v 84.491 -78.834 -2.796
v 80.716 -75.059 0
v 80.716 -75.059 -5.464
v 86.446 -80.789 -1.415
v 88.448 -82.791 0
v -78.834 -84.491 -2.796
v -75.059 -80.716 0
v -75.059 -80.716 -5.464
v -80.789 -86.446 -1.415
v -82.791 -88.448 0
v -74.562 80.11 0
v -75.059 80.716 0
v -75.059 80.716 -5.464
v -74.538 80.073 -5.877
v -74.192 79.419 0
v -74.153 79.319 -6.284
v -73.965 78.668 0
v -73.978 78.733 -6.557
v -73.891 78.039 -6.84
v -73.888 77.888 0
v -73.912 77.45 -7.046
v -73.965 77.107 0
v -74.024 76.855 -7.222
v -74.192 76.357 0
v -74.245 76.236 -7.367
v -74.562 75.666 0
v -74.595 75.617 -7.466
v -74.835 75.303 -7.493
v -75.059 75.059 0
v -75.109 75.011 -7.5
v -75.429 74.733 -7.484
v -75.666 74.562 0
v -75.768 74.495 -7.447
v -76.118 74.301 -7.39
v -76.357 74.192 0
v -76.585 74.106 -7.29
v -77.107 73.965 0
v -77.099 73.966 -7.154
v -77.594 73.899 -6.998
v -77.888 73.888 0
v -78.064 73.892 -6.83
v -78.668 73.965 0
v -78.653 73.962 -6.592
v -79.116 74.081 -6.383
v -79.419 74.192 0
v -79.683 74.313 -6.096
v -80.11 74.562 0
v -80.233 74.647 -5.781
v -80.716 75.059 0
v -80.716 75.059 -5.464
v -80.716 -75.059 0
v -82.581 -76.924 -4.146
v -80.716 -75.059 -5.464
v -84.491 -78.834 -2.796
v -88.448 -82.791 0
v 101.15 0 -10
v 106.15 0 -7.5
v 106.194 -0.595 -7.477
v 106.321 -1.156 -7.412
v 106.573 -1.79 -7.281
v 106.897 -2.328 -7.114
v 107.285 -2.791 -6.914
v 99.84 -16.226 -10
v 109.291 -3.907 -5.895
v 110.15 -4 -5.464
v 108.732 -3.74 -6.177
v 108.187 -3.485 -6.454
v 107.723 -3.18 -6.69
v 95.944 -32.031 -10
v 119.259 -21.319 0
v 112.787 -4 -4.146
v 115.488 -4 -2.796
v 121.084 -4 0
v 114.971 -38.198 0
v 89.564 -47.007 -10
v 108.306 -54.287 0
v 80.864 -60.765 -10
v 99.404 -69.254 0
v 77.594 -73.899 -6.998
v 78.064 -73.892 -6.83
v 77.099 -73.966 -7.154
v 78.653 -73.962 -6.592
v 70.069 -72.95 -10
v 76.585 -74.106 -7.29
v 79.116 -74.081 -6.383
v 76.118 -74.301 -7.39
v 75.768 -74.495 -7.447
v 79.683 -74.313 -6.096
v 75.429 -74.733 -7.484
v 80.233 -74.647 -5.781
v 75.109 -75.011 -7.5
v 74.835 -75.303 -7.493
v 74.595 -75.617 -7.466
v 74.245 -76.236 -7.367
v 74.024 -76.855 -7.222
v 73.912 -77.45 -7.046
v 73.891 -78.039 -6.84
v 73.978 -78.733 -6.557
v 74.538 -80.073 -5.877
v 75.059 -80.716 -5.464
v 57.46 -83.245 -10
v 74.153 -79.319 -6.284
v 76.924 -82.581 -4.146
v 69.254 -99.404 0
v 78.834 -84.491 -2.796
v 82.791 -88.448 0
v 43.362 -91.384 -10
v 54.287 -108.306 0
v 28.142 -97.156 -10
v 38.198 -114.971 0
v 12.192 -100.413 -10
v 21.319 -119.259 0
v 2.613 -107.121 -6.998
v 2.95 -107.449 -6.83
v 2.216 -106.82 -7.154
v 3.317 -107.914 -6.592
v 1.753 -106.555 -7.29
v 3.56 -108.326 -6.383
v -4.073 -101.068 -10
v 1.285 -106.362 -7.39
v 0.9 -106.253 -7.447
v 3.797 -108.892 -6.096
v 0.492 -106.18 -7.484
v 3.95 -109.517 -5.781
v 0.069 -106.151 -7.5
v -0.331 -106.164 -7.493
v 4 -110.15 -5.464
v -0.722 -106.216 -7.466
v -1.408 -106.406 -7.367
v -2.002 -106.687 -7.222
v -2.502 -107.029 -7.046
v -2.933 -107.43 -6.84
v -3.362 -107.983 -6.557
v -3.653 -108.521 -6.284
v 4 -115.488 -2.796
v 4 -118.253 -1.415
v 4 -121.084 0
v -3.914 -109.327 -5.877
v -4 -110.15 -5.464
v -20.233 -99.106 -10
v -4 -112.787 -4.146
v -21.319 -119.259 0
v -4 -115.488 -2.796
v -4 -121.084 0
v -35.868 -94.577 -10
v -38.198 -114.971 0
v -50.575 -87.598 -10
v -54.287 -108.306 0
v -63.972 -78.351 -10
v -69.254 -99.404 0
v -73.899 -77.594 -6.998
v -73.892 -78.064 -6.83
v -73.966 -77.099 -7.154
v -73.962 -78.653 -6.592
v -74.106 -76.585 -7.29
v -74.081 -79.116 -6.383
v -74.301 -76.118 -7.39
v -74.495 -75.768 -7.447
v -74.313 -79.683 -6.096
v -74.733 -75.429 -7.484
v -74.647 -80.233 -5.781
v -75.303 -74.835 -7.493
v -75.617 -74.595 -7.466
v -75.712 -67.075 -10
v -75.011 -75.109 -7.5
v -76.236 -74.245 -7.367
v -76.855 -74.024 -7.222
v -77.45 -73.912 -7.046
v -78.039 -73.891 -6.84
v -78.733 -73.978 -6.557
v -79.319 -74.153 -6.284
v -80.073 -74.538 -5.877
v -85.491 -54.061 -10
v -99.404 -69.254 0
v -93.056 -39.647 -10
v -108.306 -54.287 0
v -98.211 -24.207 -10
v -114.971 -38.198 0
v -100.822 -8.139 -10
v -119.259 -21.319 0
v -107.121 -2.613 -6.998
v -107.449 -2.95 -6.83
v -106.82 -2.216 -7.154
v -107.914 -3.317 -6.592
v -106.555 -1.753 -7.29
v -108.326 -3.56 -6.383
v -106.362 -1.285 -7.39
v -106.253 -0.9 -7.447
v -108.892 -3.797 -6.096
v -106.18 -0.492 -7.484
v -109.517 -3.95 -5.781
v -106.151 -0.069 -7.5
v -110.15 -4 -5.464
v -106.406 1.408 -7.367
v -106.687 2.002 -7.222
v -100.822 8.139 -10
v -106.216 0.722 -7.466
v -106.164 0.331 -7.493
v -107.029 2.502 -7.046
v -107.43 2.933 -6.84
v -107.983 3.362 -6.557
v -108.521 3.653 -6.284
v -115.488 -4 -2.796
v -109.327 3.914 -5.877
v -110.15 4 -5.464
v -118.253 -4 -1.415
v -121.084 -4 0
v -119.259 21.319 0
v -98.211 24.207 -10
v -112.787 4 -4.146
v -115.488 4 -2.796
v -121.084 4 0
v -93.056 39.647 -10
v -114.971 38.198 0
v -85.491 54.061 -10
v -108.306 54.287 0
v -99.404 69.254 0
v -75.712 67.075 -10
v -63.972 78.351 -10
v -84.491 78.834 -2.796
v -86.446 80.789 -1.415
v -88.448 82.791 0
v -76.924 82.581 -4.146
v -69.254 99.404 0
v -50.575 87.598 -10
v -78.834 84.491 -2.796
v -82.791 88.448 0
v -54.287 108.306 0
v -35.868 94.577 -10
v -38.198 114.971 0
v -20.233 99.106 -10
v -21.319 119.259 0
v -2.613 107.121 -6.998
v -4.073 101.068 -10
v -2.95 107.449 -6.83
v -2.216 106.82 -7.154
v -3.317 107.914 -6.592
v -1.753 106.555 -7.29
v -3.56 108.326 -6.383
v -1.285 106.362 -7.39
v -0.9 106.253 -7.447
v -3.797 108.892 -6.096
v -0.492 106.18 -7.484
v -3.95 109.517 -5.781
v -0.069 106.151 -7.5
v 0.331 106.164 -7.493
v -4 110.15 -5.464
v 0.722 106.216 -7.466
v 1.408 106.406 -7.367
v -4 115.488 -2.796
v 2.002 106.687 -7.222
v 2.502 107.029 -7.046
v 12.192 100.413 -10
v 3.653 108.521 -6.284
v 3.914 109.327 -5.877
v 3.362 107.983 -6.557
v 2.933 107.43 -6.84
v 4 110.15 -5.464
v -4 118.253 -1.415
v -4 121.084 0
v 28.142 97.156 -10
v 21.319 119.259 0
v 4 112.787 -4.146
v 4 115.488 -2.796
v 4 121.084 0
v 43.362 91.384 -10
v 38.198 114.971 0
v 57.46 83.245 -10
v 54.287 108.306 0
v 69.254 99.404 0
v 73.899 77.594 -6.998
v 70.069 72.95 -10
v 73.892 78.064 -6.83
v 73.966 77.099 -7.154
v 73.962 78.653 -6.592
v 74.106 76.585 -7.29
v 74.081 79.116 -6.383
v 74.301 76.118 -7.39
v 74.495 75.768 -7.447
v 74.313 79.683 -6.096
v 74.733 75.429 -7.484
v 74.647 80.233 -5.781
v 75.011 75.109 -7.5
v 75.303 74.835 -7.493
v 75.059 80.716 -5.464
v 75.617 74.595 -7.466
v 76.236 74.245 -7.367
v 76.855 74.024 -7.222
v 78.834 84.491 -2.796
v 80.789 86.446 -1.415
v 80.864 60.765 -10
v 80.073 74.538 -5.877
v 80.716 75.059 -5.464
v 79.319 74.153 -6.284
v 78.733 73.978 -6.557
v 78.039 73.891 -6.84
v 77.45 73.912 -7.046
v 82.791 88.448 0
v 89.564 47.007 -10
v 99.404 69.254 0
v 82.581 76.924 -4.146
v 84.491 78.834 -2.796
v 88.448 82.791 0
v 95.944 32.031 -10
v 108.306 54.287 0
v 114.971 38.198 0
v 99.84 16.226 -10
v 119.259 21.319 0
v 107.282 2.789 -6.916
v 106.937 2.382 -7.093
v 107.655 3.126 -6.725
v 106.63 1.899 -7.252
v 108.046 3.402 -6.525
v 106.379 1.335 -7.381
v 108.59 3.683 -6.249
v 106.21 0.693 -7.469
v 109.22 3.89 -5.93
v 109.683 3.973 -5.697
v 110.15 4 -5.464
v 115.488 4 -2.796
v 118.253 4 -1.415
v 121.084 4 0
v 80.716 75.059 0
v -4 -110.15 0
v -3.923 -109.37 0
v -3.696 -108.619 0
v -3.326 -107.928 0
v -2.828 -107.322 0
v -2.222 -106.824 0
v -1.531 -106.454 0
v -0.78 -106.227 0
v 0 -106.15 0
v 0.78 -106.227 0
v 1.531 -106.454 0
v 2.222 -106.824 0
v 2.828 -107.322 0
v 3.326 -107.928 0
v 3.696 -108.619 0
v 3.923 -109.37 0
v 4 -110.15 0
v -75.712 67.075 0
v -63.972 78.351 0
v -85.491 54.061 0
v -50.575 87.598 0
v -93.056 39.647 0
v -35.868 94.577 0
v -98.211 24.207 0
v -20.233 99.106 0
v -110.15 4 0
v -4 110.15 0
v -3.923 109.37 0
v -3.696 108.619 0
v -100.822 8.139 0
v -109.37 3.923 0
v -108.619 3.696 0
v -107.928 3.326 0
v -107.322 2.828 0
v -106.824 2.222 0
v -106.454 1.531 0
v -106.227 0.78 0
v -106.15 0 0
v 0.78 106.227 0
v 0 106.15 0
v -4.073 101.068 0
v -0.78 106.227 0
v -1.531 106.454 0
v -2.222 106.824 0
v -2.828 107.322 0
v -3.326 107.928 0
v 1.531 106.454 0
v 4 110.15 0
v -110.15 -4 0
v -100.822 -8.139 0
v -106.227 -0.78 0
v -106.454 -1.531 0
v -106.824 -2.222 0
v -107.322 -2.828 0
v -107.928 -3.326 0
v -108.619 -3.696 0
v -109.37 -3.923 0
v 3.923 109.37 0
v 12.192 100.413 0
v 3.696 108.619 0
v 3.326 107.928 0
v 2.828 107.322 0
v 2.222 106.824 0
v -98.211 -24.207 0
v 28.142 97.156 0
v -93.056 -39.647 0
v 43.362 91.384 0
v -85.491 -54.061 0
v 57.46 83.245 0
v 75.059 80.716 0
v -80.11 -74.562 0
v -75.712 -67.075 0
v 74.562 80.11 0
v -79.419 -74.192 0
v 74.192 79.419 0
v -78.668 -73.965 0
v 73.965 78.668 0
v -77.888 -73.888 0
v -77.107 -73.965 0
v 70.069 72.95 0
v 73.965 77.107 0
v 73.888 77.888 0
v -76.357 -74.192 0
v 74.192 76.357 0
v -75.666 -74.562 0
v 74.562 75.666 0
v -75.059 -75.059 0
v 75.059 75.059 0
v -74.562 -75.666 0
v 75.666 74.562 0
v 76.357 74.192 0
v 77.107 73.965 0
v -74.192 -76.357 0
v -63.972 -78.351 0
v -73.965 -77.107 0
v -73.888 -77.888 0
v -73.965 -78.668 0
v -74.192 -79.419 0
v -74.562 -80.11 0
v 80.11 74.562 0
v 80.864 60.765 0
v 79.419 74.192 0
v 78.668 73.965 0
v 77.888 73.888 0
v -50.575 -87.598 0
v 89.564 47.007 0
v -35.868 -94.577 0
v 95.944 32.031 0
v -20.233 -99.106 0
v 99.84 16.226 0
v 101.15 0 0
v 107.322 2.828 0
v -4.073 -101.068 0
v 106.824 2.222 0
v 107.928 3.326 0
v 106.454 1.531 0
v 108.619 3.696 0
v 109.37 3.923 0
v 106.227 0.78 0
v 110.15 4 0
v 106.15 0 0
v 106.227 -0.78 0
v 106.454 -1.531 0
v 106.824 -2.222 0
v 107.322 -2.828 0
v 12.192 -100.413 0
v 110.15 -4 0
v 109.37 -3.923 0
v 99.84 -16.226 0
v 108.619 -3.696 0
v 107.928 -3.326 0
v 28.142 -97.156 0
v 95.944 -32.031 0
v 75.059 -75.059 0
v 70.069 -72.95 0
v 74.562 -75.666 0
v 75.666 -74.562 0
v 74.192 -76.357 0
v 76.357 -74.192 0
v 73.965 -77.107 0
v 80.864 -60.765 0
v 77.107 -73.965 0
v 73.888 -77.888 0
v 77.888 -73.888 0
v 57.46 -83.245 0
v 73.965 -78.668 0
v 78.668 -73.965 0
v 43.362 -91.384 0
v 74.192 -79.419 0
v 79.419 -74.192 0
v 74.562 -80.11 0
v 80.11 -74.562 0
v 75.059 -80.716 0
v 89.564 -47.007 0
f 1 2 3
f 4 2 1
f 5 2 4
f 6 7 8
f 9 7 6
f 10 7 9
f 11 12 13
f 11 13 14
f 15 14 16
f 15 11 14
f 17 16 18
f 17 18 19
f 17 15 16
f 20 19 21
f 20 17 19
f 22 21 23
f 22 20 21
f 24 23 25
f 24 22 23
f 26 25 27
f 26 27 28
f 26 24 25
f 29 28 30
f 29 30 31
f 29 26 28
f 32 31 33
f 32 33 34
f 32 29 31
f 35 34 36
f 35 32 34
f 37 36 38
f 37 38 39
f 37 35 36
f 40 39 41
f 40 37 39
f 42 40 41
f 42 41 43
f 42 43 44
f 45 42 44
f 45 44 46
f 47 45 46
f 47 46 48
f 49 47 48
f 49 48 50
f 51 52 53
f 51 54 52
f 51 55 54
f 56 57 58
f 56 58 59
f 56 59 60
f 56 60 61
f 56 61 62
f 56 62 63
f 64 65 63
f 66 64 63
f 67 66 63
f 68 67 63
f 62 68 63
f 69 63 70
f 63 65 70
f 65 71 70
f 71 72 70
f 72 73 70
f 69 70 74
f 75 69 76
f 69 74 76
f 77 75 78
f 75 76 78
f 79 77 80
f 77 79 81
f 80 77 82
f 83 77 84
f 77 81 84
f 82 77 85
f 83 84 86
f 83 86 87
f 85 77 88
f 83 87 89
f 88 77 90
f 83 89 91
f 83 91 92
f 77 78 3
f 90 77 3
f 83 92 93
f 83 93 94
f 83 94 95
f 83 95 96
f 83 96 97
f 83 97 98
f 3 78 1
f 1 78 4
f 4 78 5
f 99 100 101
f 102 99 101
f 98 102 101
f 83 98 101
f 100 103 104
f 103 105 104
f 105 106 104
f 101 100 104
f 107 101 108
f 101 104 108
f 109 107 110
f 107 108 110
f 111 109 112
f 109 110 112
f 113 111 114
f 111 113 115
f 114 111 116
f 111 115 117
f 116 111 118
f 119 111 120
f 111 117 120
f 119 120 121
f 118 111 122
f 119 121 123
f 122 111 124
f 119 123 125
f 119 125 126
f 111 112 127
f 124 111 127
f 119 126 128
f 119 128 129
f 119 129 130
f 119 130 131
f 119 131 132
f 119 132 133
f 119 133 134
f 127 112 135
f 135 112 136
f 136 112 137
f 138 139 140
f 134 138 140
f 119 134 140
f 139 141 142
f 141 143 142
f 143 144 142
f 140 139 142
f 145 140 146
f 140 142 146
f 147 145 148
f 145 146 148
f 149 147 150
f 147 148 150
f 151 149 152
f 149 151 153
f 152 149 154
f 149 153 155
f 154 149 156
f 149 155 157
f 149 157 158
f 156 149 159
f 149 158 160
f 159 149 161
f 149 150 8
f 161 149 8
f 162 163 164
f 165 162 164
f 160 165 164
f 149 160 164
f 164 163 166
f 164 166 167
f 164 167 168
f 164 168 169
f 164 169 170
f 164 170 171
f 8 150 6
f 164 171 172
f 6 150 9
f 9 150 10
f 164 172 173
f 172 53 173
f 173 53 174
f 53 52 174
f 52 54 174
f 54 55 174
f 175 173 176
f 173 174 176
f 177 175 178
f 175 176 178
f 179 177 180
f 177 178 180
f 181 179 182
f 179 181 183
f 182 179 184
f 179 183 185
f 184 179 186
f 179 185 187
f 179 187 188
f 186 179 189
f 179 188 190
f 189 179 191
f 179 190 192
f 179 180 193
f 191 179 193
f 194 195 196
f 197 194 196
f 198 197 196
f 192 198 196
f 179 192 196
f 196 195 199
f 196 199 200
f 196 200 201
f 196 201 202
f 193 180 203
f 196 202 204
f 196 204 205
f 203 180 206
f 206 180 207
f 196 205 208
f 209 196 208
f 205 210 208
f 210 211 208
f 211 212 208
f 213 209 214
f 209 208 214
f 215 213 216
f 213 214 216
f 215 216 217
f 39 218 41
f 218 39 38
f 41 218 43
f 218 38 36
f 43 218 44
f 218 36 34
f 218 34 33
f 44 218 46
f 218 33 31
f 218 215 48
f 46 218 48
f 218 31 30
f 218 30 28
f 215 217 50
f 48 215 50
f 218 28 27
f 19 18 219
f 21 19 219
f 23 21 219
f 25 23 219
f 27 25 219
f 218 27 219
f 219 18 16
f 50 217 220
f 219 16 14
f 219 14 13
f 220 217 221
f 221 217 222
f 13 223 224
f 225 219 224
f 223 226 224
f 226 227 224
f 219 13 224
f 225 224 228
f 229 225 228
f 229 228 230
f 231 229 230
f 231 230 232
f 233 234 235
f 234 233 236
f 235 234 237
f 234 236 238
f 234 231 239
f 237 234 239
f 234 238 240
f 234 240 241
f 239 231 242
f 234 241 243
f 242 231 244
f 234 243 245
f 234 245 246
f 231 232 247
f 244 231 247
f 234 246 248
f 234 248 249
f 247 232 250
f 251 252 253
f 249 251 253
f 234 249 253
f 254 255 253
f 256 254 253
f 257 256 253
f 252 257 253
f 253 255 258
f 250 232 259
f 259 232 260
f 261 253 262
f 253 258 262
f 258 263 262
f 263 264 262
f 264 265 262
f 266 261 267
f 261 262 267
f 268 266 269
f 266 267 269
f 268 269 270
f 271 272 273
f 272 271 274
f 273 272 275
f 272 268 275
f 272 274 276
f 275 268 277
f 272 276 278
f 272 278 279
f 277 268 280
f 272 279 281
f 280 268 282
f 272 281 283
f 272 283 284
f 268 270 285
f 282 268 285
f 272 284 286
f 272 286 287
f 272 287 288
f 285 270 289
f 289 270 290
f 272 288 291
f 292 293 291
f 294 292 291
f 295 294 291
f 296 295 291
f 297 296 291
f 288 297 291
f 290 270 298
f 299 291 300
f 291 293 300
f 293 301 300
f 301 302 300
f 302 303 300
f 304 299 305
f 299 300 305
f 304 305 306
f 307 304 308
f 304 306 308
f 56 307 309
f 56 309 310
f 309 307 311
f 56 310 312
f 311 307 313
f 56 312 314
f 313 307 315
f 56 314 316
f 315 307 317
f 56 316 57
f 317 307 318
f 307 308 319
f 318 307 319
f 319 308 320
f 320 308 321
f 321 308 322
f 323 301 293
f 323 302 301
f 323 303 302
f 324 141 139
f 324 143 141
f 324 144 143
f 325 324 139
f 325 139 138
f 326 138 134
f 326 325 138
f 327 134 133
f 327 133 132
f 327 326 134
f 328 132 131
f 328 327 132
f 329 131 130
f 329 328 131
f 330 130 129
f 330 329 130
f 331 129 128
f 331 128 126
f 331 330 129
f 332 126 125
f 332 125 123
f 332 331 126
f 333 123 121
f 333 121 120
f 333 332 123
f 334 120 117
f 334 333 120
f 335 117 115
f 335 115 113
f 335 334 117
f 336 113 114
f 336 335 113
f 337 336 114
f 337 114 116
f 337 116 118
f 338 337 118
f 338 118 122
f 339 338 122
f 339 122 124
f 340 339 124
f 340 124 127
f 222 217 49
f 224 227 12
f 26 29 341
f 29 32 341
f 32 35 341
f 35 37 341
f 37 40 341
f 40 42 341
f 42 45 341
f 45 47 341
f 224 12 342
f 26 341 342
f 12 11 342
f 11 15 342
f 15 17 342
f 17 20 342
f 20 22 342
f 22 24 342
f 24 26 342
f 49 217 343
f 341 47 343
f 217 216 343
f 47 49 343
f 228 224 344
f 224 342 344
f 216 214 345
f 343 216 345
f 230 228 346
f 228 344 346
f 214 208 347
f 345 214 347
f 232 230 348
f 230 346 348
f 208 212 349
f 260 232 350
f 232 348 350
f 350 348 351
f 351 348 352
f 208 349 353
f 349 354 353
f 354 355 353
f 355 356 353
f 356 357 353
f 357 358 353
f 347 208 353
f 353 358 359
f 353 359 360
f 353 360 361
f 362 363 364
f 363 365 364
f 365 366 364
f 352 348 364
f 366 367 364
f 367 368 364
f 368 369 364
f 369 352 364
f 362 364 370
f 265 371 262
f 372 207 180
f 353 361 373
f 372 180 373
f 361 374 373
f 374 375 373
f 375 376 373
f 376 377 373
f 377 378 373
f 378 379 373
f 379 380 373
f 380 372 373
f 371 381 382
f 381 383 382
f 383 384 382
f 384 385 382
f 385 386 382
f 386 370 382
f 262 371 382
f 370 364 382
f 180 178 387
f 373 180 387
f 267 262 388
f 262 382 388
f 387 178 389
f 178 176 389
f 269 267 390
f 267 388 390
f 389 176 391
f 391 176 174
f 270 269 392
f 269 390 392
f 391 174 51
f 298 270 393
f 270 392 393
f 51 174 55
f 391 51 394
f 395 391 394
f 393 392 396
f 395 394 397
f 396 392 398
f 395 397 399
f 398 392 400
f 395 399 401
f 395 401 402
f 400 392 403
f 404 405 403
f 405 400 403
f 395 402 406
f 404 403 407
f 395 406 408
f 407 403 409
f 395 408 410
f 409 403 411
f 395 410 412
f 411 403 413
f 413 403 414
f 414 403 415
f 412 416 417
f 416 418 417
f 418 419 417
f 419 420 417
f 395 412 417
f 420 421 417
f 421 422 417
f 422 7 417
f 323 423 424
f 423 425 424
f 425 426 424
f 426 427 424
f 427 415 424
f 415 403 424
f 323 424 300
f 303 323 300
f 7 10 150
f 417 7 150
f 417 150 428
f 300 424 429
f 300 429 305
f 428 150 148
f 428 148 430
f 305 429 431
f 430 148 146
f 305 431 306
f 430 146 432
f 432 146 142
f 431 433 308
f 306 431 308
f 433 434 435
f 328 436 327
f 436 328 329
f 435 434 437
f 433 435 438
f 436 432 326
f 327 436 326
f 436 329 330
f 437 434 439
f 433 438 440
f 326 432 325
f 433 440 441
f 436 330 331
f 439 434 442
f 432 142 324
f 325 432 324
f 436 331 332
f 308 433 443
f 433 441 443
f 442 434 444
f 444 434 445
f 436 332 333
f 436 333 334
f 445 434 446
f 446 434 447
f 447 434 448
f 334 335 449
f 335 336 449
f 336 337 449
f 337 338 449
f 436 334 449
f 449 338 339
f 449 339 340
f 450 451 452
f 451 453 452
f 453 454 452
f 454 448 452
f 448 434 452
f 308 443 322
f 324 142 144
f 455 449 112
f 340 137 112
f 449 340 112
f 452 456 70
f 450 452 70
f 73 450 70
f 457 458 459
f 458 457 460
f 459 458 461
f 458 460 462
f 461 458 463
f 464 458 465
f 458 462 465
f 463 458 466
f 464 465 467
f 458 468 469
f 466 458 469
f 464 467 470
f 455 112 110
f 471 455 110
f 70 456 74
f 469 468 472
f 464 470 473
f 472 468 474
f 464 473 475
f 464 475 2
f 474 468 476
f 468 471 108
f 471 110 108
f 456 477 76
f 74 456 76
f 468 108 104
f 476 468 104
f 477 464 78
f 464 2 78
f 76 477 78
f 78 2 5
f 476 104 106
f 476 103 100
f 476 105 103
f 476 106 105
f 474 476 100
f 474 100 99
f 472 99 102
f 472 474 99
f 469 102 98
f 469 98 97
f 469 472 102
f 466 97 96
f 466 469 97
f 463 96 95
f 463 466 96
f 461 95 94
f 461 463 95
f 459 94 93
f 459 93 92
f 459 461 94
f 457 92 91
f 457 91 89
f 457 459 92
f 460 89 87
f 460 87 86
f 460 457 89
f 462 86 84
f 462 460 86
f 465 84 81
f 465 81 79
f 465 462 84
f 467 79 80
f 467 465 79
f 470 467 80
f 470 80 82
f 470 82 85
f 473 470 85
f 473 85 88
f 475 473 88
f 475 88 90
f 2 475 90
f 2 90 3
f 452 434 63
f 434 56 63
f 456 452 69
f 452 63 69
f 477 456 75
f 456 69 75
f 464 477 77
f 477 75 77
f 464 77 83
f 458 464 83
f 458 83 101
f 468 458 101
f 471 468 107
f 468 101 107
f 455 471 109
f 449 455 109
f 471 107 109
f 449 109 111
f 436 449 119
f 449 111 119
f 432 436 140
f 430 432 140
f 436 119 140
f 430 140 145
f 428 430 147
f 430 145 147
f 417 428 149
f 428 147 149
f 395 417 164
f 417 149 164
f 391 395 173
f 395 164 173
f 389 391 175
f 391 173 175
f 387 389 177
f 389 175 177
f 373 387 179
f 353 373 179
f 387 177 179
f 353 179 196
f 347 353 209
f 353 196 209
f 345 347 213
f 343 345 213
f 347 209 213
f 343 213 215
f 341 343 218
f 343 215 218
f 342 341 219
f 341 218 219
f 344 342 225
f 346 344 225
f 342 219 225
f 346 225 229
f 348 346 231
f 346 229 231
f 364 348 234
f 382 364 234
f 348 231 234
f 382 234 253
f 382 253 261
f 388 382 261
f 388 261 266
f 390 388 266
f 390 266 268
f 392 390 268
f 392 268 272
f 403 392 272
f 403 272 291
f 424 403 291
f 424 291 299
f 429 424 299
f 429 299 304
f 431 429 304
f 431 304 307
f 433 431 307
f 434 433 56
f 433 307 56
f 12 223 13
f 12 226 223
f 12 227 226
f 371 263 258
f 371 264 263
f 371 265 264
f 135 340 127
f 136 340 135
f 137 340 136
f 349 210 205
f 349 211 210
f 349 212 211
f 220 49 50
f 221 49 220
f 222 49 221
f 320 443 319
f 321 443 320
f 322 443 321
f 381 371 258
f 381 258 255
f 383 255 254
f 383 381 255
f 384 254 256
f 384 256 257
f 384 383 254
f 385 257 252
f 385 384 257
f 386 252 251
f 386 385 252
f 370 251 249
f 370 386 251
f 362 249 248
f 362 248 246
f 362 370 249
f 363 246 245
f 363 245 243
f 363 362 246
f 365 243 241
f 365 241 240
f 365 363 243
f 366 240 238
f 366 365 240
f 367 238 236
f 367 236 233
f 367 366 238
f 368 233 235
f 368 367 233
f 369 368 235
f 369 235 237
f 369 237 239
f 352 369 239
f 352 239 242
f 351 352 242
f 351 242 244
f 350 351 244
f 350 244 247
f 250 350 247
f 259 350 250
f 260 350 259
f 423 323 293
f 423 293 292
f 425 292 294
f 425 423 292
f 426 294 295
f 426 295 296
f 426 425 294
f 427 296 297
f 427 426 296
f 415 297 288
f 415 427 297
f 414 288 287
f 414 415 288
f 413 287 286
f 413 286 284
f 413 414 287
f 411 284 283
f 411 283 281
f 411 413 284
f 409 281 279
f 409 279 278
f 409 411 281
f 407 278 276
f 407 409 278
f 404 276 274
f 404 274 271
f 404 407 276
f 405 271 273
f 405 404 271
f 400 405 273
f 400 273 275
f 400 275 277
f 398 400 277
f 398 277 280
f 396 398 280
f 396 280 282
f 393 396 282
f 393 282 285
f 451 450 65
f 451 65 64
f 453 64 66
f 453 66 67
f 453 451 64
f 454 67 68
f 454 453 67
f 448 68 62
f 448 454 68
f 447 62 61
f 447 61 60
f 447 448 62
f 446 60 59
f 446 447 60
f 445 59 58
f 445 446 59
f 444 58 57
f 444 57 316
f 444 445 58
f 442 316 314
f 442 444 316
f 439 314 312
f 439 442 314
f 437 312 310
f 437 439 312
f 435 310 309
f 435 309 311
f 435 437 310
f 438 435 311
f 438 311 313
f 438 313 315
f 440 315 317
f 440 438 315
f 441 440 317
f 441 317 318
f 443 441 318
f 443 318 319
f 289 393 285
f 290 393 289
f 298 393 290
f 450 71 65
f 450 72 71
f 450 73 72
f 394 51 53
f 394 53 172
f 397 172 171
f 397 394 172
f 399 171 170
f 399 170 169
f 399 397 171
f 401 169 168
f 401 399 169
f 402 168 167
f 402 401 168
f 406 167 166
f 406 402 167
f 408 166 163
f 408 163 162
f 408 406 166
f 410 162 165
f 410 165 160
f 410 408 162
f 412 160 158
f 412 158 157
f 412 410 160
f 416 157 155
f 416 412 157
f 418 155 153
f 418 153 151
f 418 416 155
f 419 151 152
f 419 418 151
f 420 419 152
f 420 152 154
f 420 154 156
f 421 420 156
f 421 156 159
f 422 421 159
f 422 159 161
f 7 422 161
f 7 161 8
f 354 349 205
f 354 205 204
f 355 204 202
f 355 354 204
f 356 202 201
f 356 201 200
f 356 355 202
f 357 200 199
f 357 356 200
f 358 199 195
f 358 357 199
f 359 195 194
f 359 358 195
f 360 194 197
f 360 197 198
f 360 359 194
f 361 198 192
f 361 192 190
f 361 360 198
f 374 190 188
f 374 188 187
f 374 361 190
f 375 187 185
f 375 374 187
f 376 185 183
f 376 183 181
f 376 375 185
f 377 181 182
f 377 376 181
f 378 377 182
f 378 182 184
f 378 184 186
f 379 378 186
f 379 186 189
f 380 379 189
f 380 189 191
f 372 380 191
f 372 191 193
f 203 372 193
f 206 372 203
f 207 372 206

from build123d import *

# Parameters (mm, degrees)
CUT_EXTRUDE1_DEPTH = 10
CIRPATTERN1_COUNT  = 8


with BuildPart() as part:
    # Sketch2 → Revolve1 (revolve)
    with BuildSketch(Plane(origin=(0, 0, 0), x_dir=(0, 0, -1), z_dir=(1, 0, 0)), mode=Mode.PRIVATE) as revolve1_sk:
        Polygon((0, 121.15), (0, 101.15), (10, 101.15), align=None)
    revolve(revolve1_sk.sketch.rotate(Axis((0, 0, 25.61681186), (0, 0, -1)), 90), axis=Axis((0, 0, 25.61681186), (0, 0, -1)))

    # Sketch3 → Cut-Extrude1 (cut)
    with BuildSketch(Plane.XY):
        with BuildLine():
            Line((-4, 110.15), (-4, 131.372704066))
            Line((-4, 131.372704066), (4, 131.372704066))
            Line((4, 131.372704066), (4, 110.15))
            ThreePointArc((4, 110.15), (0, 106.15), (-4, 110.15))
        make_face()
    cut_extrude1 = extrude(amount=-CUT_EXTRUDE1_DEPTH, mode=Mode.SUBTRACT)

    # CirPattern1: Cut-Extrude1 ×8 about axis
    cirpattern1_axis = Axis((0, 0, 0), (0, 0, 1))
    for i in range(1, CIRPATTERN1_COUNT):
        add(cut_extrude1.rotate(cirpattern1_axis, i * 360 / CIRPATTERN1_COUNT), mode=Mode.SUBTRACT)


solid = part.part
